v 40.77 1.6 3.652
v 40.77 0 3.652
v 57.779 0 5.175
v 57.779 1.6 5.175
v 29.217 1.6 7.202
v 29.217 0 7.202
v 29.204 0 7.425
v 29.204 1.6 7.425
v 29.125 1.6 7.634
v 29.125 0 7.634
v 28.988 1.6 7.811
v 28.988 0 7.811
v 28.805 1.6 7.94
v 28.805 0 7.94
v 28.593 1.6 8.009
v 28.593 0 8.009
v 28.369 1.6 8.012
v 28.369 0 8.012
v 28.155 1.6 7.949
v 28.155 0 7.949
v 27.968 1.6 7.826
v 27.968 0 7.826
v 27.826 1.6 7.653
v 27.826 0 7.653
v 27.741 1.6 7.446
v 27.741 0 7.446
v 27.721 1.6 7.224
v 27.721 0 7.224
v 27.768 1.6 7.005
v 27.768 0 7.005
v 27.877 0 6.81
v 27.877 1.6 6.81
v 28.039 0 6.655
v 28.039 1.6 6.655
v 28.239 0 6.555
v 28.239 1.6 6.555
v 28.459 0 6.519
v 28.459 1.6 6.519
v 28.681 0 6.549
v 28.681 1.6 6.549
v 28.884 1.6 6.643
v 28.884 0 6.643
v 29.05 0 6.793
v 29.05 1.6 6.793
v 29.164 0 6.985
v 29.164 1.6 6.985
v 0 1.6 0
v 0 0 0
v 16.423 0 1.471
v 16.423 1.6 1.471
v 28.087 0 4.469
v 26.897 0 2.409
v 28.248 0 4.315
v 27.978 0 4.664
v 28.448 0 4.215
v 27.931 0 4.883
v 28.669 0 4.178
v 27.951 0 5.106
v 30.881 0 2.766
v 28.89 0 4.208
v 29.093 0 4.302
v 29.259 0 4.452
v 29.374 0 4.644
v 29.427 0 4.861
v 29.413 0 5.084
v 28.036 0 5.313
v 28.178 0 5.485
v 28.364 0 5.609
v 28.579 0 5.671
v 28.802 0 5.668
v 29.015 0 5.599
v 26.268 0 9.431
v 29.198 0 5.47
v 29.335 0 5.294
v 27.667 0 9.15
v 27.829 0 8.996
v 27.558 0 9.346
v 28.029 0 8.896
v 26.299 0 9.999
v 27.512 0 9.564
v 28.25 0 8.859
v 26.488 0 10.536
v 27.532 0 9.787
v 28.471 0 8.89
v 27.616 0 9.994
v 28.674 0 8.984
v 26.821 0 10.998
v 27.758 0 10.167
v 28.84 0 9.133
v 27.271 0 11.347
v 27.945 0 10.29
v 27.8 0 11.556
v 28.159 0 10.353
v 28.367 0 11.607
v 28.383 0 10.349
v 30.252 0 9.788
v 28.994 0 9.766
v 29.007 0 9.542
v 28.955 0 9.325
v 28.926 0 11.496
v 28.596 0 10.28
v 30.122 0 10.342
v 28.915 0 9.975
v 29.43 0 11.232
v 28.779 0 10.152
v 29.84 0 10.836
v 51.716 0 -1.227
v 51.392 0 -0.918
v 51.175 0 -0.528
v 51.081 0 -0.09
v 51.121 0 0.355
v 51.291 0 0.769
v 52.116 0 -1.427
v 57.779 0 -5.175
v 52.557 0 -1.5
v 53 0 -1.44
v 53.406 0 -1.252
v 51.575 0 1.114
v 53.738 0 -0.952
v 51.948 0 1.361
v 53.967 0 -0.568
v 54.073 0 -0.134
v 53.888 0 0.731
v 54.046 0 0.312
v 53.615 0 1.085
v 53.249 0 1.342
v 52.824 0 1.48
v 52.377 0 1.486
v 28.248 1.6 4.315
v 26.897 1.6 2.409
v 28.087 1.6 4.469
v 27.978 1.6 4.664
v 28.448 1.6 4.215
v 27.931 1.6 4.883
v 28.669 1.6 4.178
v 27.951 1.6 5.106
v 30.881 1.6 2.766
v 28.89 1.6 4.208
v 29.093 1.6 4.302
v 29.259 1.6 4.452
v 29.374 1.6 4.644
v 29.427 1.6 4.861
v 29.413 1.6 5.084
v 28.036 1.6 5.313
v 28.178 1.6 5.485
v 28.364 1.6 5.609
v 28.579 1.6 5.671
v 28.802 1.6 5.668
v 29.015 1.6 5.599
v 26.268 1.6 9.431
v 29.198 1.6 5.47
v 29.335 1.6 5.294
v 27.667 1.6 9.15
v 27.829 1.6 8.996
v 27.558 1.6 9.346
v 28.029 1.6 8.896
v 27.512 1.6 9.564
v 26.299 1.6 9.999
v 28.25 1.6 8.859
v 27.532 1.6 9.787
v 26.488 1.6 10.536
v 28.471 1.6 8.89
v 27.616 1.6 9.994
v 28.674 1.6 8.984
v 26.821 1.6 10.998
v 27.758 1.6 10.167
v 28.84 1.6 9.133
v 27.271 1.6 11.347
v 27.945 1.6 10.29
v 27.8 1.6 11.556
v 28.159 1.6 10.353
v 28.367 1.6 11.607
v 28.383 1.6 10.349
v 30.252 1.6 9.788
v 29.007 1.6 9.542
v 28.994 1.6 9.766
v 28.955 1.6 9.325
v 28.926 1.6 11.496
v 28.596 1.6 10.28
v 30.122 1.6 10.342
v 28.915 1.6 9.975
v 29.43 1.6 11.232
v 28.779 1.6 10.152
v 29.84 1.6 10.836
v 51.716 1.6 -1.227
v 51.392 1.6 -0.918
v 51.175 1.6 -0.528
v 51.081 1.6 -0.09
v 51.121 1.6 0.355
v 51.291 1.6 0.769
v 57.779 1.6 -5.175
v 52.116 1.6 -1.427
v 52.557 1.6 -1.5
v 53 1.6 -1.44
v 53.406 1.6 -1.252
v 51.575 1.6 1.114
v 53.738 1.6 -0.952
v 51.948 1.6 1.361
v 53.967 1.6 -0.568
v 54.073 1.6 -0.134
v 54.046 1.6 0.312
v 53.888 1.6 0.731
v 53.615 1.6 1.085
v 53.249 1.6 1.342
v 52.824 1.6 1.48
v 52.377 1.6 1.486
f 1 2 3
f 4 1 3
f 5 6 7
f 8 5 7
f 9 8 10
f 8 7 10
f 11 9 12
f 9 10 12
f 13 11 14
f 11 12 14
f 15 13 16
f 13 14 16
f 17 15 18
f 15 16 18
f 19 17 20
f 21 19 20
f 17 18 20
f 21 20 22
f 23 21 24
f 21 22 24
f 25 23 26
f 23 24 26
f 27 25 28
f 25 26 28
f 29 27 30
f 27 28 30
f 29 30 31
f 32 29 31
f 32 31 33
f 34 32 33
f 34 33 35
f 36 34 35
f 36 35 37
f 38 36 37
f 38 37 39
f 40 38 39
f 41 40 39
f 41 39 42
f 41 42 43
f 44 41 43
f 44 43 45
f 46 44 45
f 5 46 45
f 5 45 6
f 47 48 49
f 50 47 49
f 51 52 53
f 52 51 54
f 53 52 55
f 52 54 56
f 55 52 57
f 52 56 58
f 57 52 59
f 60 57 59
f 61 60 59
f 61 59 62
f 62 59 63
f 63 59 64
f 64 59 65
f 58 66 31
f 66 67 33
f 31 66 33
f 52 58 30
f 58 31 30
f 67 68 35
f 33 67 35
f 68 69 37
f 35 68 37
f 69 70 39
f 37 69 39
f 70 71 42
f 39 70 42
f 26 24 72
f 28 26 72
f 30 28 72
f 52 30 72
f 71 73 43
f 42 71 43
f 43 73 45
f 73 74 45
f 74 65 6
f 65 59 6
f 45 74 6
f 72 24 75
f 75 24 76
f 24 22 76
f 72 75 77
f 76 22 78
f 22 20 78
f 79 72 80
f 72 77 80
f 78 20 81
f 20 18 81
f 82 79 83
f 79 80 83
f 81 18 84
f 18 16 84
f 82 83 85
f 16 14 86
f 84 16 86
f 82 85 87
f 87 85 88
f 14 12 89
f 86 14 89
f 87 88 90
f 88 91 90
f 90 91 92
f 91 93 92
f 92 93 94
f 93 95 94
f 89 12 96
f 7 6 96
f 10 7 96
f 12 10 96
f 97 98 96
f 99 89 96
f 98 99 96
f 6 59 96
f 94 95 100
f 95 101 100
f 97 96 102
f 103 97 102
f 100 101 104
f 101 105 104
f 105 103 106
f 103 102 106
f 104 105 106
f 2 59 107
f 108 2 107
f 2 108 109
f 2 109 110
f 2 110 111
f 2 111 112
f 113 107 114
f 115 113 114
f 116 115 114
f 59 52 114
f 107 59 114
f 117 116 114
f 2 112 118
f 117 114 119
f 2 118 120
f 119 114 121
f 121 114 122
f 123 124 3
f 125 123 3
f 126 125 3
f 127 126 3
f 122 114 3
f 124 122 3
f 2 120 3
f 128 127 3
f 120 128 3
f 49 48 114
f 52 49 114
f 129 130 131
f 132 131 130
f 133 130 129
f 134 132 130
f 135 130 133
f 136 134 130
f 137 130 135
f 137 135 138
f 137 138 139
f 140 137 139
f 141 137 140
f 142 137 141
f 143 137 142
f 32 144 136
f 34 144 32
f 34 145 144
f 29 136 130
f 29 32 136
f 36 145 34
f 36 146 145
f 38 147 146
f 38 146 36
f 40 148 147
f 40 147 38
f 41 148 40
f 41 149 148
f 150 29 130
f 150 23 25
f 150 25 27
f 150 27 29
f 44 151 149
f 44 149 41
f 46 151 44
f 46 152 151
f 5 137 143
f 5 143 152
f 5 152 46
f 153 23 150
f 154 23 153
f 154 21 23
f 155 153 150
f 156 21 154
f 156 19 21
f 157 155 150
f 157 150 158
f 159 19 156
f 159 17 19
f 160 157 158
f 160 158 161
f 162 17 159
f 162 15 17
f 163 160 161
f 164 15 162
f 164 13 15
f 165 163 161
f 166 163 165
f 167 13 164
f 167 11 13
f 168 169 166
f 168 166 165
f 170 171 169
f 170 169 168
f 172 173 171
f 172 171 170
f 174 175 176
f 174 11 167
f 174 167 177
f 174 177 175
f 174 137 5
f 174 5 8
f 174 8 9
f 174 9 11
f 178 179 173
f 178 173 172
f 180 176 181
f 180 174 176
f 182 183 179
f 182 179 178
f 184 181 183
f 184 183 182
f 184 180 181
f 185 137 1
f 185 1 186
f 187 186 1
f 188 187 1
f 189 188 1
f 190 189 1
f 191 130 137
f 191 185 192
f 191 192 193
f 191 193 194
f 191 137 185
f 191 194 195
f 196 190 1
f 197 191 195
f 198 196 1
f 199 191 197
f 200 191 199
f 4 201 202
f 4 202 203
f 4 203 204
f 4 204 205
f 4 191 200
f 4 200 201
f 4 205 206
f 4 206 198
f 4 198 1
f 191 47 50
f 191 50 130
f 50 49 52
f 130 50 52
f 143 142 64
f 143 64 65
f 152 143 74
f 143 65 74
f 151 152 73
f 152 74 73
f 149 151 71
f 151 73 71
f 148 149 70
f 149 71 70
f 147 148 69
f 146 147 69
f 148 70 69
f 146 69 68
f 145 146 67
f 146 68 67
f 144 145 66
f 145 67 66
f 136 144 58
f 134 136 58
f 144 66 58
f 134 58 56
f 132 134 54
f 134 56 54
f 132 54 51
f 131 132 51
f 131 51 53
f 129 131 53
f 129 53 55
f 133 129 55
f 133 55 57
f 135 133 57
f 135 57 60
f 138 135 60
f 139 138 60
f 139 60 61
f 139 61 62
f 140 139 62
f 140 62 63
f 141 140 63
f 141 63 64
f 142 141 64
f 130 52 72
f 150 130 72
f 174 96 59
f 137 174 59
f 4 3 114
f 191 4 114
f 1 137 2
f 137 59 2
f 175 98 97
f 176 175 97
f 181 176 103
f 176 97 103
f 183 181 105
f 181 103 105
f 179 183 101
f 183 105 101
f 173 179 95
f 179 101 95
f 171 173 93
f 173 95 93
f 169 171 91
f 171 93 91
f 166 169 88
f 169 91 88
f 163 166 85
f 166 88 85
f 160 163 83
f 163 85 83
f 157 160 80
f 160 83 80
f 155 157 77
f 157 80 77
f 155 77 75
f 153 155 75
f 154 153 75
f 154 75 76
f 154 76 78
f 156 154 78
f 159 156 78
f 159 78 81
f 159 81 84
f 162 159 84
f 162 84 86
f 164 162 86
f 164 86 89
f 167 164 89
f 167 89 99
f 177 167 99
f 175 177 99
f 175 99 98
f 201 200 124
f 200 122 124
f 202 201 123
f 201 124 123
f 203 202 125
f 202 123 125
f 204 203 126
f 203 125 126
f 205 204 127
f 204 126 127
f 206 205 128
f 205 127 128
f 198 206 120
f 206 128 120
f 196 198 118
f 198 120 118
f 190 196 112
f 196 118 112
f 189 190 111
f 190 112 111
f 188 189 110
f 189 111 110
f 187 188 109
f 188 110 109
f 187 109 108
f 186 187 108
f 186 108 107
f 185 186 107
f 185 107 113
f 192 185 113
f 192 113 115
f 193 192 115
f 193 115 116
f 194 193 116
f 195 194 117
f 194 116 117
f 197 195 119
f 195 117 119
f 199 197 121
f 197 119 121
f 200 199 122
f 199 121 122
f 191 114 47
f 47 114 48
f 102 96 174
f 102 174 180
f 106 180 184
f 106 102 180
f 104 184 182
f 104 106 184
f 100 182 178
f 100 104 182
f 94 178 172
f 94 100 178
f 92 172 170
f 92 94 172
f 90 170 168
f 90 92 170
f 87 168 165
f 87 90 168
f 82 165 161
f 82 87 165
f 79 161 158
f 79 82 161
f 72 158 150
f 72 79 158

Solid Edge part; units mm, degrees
sketch "Sketch1" plane through (0, 0, 0) normal (0, -1, 0) x (1, 0, 0)
  line L0 (0, 0) -> (57.7787, 5.175)
  line L1 (57.7787, 5.175) -> (57.7787, -5.175)
  line L2 (57.7787, -5.175) -> (0, 0)
extrude "Protrusion1" add sketch "Sketch1" against normal blind 1.6
sketch "Sketch2" plane through (28.8062, 0, 0) normal (0, -1, 0) x (0.996013, 0, -0.0892088)
  circle A0 centre (23.6777, 2.1207) radius 1.5
extrude "Cutout1" cut sketch "Sketch2" against normal up to next
sketch "Sketch3" plane through (28.8062, 0, 0) normal (0, -1, 0) x (0.996013, 0, -0.0892088)
  circle A0 centre (23.6777, 2.1207) radius 1.5
  line L0 (29.3186, -2.5698) -> (-28.6914, -2.5698)
  line L1 (28.3953, 7.739) -> (29.3186, -2.5698)
  line L2 (1.8202, 2.94) -> (28.3953, 7.739)
  line L3 (0.5673, 9.8778) -> (1.8202, 2.94)
  arc A1 (-3.369, 9.167) -> (0.5673, 9.8778) centre (-1.4008, 9.5224) cw
  line L4 (-2.1162, 2.2292) -> (-3.369, 9.167)
  line L5 (-28.6914, -2.5698) -> (-2.1162, 2.2292)
  circle A2 centre (-0.5656, 4.8972) radius 0.75
  circle A3 centre (-0.9832, 7.2098) radius 0.75
  circle A4 centre (-1.4008, 9.5224) radius 0.75
extrude "Protrusion2" add sketch "Sketch3" against normal up to vertex (1.6 mm away)
properties material "Wood, balsa"
